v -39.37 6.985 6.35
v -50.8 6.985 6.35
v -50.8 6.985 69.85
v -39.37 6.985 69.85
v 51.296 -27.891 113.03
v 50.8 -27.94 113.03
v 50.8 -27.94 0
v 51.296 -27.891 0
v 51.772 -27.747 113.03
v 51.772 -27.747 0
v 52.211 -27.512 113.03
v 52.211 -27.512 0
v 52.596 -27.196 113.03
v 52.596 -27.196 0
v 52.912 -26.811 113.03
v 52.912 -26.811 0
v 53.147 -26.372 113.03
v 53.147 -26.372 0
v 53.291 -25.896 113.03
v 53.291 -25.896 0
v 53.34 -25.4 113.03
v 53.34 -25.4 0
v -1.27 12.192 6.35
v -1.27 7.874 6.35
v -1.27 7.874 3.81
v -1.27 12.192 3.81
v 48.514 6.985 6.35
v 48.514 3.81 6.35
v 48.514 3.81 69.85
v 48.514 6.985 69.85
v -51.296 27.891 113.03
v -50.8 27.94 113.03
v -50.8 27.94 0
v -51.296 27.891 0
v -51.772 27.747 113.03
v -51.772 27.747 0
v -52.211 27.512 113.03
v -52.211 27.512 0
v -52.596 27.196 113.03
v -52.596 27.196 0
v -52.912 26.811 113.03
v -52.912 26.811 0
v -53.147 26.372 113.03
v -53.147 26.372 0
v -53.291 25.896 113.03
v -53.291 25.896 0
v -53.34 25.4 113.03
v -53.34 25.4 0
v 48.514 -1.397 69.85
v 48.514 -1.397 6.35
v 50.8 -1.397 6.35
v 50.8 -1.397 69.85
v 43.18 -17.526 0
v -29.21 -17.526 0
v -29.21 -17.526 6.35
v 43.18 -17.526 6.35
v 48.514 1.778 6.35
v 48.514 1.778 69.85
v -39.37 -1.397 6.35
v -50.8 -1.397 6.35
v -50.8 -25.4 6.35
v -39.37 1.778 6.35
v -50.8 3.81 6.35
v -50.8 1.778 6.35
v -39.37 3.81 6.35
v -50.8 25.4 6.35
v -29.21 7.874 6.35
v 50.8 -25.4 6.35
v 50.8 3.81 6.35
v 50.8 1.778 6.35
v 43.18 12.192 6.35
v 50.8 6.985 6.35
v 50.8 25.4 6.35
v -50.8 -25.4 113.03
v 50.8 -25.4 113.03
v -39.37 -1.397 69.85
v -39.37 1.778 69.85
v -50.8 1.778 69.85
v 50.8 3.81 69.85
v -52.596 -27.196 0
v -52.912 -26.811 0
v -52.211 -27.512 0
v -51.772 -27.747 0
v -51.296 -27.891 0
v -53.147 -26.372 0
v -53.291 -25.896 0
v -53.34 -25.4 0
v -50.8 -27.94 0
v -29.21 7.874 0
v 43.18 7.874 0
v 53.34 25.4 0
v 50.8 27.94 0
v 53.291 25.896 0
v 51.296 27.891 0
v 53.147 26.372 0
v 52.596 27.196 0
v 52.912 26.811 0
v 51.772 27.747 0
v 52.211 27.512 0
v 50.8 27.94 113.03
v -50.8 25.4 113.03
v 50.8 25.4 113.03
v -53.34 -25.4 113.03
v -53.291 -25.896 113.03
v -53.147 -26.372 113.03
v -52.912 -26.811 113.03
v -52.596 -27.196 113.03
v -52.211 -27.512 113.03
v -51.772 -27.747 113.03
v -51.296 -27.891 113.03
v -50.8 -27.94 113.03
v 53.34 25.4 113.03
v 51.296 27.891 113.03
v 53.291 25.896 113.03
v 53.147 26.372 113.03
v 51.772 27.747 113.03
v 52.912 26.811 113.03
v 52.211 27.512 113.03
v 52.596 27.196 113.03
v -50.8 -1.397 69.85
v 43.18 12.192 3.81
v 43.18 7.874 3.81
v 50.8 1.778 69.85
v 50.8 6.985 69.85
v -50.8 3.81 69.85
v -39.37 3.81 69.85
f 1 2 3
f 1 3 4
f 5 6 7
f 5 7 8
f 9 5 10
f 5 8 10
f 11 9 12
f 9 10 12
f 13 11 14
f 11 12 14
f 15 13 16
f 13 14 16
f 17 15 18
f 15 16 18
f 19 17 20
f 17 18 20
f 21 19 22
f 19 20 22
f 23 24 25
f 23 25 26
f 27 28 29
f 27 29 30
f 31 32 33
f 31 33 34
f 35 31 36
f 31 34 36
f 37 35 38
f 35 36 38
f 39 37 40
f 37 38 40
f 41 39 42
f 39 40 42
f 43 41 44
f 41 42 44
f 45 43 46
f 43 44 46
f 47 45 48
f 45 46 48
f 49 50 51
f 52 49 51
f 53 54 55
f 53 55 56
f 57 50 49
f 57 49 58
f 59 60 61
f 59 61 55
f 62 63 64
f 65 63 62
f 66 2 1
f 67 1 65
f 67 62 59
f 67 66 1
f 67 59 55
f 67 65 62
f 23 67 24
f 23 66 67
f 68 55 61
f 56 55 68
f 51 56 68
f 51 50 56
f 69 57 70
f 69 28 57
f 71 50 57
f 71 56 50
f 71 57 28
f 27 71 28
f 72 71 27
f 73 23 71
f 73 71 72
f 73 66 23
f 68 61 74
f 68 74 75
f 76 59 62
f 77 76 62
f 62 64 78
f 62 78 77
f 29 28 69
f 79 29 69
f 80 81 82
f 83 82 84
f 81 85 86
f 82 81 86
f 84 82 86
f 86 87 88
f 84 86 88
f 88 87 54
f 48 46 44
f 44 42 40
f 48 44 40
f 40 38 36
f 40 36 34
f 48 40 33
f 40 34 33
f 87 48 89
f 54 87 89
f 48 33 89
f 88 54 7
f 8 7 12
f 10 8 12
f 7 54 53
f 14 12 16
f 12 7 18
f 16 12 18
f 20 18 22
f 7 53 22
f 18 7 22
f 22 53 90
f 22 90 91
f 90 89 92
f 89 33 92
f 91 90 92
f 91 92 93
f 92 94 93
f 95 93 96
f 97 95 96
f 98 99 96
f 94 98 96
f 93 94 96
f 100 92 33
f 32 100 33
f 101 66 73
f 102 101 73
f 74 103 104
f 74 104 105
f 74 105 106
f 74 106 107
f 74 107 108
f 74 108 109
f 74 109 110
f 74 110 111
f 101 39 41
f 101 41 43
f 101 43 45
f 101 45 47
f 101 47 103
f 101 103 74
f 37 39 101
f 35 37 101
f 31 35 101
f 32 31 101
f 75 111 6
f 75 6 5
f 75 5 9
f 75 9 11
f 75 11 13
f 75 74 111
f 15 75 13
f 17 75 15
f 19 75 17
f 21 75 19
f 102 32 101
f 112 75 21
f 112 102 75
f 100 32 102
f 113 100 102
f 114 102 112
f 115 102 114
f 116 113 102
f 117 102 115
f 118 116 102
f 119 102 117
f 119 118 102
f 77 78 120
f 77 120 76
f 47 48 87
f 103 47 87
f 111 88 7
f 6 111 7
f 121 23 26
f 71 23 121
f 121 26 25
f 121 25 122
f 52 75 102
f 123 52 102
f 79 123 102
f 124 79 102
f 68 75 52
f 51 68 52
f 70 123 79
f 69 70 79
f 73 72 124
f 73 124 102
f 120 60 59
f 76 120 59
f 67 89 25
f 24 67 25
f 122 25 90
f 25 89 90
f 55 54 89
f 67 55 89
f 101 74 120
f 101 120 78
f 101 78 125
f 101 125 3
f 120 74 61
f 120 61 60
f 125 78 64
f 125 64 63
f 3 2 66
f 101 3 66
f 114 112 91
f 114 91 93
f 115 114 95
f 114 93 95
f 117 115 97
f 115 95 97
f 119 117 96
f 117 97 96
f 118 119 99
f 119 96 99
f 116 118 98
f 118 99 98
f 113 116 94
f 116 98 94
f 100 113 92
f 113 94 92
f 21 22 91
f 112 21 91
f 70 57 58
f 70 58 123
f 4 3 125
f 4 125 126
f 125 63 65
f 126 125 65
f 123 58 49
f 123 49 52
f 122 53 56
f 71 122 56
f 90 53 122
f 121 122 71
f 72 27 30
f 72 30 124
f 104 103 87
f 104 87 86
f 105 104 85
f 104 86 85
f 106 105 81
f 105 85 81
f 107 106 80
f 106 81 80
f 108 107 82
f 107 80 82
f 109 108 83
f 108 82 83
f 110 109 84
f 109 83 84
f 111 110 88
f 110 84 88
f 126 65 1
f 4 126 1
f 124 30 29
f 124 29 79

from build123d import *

# Parameters (mm, degrees)
F0_W     = 101.6
F0_H     = 50.8
F1_DEPTH = 113.03
F0_W_2   = 72.39
F0_H_2   = 25.4
F2_DEPTH = 6.35
F3_W     = 44.45
F3_H     = 4.318
F4_DEPTH = 2.54
F5_W     = 11.43
F5_H     = 3.175
F6_DEPTH = 63.5
F7_W     = 2.286
F7_H     = 3.175
F8_DEPTH = 63.5


with BuildPart() as f1:
    # F0 (on Top) → F1 (new body)
    with BuildSketch(Plane.XY):
        with BuildLine():
            ThreePointArc((53.34, 25.4), (52.5960512242, 27.1960512242), (50.8, 27.94))
            Line((50.8, 27.94), (-50.8, 27.94))
            ThreePointArc((-50.8, 27.94), (-52.5960512242, 27.1960512242), (-53.34, 25.4))
            Line((-53.34, 25.4), (-53.34, -25.4))
            ThreePointArc((-53.34, -25.4), (-52.5960512242, -27.1960512242), (-50.8, -27.94))
            Line((-50.8, -27.94), (50.8, -27.94))
            ThreePointArc((50.8, -27.94), (52.5960512242, -27.1960512242), (53.34, -25.4))
            Line((53.34, -25.4), (53.34, 25.4))
        make_face()
        Rectangle(F0_W, F0_H, mode=Mode.SUBTRACT)
    extrude(amount=F1_DEPTH)

    # F0 (on Top) → F2 (join)
    with BuildSketch(Plane.XY):
        with BuildLine():
            ThreePointArc((53.34, 25.4), (52.5960512242, 27.1960512242), (50.8, 27.94))
            Line((50.8, 27.94), (-50.8, 27.94))
            ThreePointArc((-50.8, 27.94), (-52.5960512242, 27.1960512242), (-53.34, 25.4))
            Line((-53.34, 25.4), (-53.34, -25.4))
            ThreePointArc((-53.34, -25.4), (-52.5960512242, -27.1960512242), (-50.8, -27.94))
            Line((-50.8, -27.94), (50.8, -27.94))
            ThreePointArc((50.8, -27.94), (52.5960512242, -27.1960512242), (53.34, -25.4))
            Line((53.34, -25.4), (53.34, 25.4))
        make_face()
        Rectangle(F0_W, F0_H, mode=Mode.SUBTRACT)
        Rectangle(F0_W, F0_H)
        with Locations((6.985, -4.826)):
            Rectangle(F0_W_2, F0_H_2, mode=Mode.SUBTRACT)
    extrude(amount=F2_DEPTH)

    # F3 (on face) → F4 (cut)
    with BuildSketch(Plane.XY.offset(6.35)):
        with Locations((20.955, 10.033)):
            Rectangle(F3_W, F3_H)
    extrude(amount=-F4_DEPTH, mode=Mode.SUBTRACT)

    # F5 (on face) → F6 (join)
    with BuildSketch(Plane.XY.offset(6.35)):
        with Locations((-45.085, 5.3975)):
            Rectangle(F5_W, F5_H)
        with Locations((-45.085, 0.1905)):
            Rectangle(F5_W, F5_H)
    extrude(amount=F6_DEPTH)

    # F7 (on face) → F8 (join)
    with BuildSketch(Plane.XY.offset(6.35)):
        with Locations((49.657, 5.3975)):
            Rectangle(F7_W, F7_H)
        with Locations((49.657, 0.1905)):
            Rectangle(F7_W, F7_H)
    extrude(amount=F8_DEPTH)


solid = f1.part
